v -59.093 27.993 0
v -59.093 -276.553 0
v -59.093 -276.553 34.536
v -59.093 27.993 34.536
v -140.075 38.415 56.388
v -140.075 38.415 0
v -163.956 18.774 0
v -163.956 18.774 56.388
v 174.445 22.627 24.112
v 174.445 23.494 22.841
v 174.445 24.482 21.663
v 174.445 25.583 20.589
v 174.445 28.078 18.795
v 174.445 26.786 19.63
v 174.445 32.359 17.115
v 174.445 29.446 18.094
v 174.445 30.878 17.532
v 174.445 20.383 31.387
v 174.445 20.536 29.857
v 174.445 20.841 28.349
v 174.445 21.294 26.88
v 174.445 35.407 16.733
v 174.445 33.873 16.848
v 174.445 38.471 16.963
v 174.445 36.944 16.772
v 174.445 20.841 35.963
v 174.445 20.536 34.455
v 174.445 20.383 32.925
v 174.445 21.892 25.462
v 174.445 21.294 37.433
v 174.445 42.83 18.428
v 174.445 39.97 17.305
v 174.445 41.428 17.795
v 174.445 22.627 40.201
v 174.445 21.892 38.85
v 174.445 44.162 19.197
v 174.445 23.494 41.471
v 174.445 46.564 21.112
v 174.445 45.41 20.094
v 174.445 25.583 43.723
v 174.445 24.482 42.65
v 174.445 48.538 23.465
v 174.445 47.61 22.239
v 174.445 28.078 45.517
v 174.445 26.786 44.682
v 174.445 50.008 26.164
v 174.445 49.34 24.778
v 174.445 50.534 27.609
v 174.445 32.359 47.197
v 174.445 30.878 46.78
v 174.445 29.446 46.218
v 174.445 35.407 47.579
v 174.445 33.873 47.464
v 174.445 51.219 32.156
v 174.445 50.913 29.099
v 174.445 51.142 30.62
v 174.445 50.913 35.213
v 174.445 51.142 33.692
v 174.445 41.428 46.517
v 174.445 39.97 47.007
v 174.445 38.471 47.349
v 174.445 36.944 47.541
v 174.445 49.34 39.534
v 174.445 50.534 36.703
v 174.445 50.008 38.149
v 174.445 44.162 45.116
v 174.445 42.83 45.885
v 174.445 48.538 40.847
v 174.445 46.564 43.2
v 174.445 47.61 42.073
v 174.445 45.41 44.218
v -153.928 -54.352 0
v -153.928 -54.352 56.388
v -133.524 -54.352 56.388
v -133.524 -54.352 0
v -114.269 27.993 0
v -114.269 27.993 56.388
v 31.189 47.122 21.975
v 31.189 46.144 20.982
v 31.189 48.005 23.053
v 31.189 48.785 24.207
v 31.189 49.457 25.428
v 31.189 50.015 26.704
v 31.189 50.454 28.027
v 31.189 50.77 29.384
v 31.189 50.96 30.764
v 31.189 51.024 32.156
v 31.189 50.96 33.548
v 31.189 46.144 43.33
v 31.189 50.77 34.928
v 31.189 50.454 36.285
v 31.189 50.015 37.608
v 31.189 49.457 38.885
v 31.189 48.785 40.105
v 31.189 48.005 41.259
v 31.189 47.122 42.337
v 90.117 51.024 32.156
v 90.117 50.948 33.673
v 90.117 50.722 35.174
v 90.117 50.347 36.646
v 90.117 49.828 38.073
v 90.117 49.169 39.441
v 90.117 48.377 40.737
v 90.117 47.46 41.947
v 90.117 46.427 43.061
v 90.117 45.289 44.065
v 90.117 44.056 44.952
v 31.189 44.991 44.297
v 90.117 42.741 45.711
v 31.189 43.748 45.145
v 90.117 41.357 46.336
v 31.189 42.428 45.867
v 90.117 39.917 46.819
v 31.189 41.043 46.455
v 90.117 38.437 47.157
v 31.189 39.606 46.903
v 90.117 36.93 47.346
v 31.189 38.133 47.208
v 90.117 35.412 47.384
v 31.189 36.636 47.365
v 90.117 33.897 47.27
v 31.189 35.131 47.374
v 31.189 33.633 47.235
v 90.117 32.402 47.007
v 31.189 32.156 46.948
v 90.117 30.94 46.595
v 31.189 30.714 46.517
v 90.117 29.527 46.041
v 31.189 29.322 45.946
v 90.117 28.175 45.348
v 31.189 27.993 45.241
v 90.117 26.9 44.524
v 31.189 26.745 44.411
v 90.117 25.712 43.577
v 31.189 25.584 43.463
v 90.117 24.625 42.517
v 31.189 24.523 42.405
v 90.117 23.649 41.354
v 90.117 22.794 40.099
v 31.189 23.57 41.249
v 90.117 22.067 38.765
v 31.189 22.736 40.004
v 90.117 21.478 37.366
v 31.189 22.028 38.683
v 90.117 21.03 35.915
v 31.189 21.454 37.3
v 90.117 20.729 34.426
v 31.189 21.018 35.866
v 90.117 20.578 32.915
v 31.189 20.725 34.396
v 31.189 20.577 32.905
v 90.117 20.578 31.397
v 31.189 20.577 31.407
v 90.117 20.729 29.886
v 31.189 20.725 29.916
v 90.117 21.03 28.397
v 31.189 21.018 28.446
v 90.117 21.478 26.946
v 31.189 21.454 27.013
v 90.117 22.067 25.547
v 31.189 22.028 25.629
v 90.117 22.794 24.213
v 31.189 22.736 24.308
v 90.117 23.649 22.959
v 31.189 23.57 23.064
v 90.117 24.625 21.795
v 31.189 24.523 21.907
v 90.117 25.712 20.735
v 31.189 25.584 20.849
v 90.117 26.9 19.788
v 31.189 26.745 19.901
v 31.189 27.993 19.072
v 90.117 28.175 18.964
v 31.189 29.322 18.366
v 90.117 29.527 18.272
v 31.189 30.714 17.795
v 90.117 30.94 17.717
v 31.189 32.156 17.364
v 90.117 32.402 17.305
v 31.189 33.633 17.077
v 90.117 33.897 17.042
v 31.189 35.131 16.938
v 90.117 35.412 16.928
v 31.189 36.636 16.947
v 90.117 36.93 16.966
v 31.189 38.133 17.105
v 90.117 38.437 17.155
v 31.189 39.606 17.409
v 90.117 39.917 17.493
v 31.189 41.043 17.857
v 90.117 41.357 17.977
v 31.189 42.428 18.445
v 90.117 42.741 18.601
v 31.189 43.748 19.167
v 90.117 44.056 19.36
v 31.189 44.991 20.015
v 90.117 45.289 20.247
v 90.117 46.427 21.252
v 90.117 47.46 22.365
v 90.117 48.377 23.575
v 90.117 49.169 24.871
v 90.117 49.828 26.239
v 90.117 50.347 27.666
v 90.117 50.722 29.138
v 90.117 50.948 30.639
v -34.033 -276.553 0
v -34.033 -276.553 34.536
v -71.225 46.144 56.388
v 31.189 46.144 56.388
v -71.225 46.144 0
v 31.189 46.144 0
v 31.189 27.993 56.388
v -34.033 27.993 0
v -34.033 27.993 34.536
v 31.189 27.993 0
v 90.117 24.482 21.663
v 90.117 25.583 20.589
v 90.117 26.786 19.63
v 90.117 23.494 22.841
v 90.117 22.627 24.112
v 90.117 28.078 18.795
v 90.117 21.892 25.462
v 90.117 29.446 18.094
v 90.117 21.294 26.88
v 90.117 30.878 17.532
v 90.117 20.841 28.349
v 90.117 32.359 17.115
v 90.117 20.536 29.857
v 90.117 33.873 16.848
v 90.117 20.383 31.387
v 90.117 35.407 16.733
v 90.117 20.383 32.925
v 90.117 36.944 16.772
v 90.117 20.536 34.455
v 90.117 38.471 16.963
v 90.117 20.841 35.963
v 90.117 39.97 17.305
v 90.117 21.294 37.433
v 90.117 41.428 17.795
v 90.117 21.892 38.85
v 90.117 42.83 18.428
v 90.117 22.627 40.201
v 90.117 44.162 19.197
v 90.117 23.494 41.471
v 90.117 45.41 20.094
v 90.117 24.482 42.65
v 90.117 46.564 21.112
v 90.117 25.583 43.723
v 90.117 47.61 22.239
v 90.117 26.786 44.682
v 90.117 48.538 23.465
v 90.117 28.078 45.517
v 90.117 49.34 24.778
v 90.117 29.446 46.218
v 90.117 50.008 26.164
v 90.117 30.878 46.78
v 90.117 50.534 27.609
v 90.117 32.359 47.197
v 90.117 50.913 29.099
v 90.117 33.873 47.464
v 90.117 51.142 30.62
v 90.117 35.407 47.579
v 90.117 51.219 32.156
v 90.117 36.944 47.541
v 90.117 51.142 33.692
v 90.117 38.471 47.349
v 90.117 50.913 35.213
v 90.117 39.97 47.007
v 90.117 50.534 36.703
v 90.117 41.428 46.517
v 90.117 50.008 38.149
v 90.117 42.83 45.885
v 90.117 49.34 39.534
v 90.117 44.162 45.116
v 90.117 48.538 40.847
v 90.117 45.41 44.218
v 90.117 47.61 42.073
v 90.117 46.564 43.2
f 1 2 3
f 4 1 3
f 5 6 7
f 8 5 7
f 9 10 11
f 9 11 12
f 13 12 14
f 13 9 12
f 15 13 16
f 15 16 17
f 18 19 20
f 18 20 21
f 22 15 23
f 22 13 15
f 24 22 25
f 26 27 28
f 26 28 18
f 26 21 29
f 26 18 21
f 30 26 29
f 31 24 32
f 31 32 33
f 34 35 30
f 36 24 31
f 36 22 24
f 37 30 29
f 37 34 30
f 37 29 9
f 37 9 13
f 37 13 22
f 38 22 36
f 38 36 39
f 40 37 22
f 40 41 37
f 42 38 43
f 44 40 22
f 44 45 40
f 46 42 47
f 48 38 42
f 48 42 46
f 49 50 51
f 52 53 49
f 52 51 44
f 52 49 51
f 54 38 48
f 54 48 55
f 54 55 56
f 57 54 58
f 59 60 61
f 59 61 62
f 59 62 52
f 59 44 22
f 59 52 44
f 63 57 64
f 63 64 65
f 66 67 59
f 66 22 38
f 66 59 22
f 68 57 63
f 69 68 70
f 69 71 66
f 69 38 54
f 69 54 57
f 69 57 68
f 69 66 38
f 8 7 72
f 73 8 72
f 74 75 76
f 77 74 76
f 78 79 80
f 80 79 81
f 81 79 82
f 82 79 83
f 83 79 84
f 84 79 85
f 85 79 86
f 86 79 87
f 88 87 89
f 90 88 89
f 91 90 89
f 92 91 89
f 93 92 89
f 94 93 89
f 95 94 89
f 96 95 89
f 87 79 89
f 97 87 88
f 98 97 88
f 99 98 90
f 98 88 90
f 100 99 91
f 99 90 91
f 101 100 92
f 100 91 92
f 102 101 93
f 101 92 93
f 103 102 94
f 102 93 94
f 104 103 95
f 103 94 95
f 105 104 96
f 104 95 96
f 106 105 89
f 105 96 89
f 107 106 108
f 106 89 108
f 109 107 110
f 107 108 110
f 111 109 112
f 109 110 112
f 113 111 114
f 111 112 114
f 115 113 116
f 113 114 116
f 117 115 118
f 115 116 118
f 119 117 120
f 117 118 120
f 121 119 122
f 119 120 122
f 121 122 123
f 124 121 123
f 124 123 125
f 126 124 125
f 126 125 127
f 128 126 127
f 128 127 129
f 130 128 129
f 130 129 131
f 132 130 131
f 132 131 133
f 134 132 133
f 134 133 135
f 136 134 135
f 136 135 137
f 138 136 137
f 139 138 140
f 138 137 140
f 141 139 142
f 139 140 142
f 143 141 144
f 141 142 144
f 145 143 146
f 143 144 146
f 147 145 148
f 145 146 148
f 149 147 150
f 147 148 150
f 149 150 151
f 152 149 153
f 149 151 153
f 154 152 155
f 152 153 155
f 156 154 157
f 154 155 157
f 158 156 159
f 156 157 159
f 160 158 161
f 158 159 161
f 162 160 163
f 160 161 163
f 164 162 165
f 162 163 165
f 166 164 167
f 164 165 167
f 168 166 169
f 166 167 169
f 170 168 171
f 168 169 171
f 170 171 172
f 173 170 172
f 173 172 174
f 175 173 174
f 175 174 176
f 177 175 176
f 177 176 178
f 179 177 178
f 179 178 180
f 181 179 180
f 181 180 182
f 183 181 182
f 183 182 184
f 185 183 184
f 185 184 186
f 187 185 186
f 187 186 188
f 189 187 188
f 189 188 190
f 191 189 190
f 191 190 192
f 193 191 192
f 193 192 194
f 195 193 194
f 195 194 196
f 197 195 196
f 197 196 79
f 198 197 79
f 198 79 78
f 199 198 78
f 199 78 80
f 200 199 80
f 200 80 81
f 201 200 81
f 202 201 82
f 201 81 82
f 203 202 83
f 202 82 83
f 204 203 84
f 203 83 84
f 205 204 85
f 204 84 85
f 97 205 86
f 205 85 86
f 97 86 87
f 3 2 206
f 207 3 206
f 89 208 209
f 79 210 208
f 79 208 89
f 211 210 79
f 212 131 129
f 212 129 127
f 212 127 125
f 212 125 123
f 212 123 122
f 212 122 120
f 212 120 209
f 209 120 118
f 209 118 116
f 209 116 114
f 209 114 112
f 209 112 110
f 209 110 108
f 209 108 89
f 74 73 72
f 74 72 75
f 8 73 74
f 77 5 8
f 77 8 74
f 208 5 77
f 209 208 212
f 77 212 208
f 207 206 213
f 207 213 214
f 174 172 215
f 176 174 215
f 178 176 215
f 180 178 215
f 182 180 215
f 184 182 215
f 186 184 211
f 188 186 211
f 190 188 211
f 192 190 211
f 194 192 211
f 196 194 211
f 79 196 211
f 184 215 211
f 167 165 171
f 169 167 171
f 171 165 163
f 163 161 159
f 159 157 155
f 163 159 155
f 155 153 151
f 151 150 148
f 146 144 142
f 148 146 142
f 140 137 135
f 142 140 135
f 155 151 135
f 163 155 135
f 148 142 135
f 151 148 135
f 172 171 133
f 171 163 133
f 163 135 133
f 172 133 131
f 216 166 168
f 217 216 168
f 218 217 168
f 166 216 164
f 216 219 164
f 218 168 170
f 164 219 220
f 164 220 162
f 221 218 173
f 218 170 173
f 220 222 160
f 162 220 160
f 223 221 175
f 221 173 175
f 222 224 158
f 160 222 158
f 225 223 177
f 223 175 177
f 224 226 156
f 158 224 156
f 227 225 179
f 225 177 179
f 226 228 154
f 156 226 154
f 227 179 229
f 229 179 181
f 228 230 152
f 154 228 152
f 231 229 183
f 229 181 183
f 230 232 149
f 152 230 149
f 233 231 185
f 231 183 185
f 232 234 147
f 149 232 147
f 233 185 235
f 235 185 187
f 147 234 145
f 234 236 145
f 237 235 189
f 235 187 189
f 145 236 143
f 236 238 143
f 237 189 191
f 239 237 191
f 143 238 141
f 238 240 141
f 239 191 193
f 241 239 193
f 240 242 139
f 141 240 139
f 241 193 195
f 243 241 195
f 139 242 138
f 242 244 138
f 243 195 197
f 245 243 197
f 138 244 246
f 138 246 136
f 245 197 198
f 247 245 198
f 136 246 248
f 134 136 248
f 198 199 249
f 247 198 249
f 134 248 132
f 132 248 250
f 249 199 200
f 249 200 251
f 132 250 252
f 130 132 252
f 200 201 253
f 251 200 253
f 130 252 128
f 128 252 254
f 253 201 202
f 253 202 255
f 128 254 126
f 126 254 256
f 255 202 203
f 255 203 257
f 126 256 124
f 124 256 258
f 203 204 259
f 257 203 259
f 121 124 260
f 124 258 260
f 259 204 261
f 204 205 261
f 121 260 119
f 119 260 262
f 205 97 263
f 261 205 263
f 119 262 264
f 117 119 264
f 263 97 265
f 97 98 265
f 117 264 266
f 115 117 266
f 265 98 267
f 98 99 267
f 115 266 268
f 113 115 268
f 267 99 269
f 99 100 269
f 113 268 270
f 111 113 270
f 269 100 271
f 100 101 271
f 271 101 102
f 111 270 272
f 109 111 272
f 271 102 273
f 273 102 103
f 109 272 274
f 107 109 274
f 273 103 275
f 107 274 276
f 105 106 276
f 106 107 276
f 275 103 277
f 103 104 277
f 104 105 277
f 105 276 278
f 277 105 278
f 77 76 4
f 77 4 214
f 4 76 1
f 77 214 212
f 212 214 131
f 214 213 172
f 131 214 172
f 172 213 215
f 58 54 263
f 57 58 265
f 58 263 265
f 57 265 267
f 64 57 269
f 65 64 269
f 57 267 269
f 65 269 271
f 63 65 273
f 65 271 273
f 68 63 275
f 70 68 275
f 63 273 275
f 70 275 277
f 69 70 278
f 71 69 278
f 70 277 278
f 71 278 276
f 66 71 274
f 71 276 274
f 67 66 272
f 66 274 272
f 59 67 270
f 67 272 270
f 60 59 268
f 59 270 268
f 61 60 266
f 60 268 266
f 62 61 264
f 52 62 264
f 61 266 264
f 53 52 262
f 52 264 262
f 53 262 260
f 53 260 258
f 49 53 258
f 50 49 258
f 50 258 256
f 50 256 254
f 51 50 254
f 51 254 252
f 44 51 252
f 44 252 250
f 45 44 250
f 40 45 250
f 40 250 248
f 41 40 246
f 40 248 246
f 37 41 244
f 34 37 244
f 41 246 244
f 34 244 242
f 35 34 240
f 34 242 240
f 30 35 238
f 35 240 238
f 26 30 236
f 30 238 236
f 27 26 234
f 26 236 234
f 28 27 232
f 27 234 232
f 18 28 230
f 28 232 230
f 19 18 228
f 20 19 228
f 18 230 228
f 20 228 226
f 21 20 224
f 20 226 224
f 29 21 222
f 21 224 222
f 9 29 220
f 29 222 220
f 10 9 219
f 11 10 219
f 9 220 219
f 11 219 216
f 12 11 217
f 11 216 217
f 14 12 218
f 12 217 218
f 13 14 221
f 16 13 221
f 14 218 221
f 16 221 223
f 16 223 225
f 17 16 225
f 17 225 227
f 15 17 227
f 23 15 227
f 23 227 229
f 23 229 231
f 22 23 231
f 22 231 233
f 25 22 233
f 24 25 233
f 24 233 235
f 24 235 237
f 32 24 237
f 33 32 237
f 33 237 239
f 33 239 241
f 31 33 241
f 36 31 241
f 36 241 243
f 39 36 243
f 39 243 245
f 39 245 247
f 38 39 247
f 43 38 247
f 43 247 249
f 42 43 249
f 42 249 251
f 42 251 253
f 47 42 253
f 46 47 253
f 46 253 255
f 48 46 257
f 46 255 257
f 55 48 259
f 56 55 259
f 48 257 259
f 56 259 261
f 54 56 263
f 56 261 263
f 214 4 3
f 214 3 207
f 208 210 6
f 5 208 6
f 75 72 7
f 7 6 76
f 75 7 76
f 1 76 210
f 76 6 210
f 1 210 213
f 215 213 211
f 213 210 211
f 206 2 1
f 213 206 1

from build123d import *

# Parameters (mm, degrees)
F0_W     = 102.4136152118
F0_H     = 18.15164648
F1_DEPTH = 56.388
F2_W     = 25.0601731241
F2_H     = 34.5359966159
F3_DEPTH = 304.546
F4_R     = 15.2325553806
F5_DEPTH = 58.928
F6_R     = 15.4275535789
F7_DEPTH = 84.328


with BuildPart() as f1:
    # F0 (on Top) → F1 (new body)
    with BuildSketch(Plane.XY):
        with Locations((-20.018090494, 37.0683530346)):
            Rectangle(F0_W, F0_H)
        Polygon((-71.2248980999, 27.9925297946), (-71.2248980999, 46.1441762745), (-140.0751024485, 38.4146161377), (-163.9562547207, 18.7738258392), (-153.9280861616, -54.3515346944), (-133.5243433714, -54.3515346944), (-114.2685189843, 27.9925297946), align=None)
    extrude(amount=F1_DEPTH)

    # F2 (on face) → F3 (join)
    with BuildSketch(Plane.XZ.offset(-27.9925297946)):
        with Locations((-46.5627107769, 17.2679983079)):
            Rectangle(F2_W, F2_H)
    extrude(amount=F3_DEPTH)

    # F4 (on face) → F5 (join)
    with BuildSketch(Plane.YZ.offset(31.1887171119)):
        with Locations((35.7915498316, 32.1561060846)):
            Circle(F4_R)
    extrude(amount=F5_DEPTH)

    # F6 (on face) → F7 (join)
    with BuildSketch(Plane.YZ.offset(90.1167171119)):
        with Locations((35.7915498316, 32.1561060846)):
            Circle(F6_R)
    extrude(amount=F7_DEPTH)


solid = f1.part
